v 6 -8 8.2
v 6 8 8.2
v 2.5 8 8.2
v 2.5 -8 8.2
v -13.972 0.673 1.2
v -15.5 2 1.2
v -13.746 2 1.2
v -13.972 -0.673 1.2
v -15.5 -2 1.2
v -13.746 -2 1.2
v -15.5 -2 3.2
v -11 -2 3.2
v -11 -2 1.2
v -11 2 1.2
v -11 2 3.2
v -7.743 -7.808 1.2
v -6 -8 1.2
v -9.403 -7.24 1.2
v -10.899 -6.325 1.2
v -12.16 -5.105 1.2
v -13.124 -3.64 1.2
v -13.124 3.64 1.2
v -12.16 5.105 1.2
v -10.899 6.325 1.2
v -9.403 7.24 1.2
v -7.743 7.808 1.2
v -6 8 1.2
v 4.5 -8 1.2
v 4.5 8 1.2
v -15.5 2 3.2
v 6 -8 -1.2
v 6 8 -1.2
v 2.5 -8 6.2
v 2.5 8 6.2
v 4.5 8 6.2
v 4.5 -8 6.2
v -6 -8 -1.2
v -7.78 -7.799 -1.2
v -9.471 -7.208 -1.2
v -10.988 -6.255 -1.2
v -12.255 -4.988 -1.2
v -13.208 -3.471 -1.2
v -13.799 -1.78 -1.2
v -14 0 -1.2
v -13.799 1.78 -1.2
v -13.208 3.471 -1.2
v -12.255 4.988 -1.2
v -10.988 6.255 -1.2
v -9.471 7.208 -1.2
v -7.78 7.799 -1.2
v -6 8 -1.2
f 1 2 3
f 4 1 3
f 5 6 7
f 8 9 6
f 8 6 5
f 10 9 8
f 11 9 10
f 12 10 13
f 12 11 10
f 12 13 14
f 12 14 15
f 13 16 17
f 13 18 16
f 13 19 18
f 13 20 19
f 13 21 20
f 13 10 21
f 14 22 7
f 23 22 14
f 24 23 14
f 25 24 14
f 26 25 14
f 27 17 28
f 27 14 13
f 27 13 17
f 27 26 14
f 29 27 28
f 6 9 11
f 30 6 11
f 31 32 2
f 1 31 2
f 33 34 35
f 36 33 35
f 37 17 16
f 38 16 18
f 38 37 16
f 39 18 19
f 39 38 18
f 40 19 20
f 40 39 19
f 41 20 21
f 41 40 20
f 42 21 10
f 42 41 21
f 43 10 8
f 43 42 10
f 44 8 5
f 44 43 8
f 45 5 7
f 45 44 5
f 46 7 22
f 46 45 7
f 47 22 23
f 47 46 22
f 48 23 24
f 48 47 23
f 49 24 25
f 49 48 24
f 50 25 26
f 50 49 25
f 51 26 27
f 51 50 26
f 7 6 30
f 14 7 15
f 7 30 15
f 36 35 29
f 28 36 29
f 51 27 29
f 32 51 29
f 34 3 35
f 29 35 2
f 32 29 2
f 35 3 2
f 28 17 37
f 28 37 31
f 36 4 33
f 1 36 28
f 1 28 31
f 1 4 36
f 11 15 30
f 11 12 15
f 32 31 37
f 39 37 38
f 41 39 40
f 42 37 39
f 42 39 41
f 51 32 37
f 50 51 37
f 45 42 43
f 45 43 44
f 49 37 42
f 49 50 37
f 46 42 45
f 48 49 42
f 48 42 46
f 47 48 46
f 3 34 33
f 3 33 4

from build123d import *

# Parameters (mm, degrees)
F0_W     = 2
F0_H     = 2
F1_DEPTH = 8
F2_ANGLE = 180
F0_W_2   = 1.5
F0_W_3   = 3
F3_DEPTH = 2


with BuildPart() as f1:
    # F0 (on Front) → F1 (new body, symmetric)
    with BuildSketch(Plane.XZ):
        with Locations((3.5, 7.2)):
            Rectangle(F0_W, F0_H)
        Polygon((4.5, 1.2), (6, 1.2), (6, 8.2), (4.5, 8.2), (4.5, 6.2), align=None)
        Polygon((-6, -1.2), (6, -1.2), (6, 1.2), (4.5, 1.2), (-6, 1.2), align=None)
    extrude(amount=F1_DEPTH, both=True)

    # F0 (on Front) → F2 (revolve, symmetric)
    with BuildSketch(Plane.XZ) as f2_sk:
        Polygon((-14, -1.2), (-6, -1.2), (-6, 1.2), (-11, 1.2), (-14, 1.2), align=None)
    revolve(axis=Axis((-6, 0, 0), (0, 0, 1)), revolution_arc=F2_ANGLE / 2)
    revolve(f2_sk.sketch, axis=Axis((-6, 0, 0), (0, 0, -1)), revolution_arc=F2_ANGLE / 2)

    # F0 (on Front) → F3 (join, symmetric)
    with BuildSketch(Plane.XZ):
        with Locations((-14.75, 2.2)):
            Rectangle(F0_W_2, F0_H)
        with Locations((-12.5, 2.2)):
            Rectangle(F0_W_3, F0_H)
    extrude(amount=F3_DEPTH, both=True)


solid = f1.part
